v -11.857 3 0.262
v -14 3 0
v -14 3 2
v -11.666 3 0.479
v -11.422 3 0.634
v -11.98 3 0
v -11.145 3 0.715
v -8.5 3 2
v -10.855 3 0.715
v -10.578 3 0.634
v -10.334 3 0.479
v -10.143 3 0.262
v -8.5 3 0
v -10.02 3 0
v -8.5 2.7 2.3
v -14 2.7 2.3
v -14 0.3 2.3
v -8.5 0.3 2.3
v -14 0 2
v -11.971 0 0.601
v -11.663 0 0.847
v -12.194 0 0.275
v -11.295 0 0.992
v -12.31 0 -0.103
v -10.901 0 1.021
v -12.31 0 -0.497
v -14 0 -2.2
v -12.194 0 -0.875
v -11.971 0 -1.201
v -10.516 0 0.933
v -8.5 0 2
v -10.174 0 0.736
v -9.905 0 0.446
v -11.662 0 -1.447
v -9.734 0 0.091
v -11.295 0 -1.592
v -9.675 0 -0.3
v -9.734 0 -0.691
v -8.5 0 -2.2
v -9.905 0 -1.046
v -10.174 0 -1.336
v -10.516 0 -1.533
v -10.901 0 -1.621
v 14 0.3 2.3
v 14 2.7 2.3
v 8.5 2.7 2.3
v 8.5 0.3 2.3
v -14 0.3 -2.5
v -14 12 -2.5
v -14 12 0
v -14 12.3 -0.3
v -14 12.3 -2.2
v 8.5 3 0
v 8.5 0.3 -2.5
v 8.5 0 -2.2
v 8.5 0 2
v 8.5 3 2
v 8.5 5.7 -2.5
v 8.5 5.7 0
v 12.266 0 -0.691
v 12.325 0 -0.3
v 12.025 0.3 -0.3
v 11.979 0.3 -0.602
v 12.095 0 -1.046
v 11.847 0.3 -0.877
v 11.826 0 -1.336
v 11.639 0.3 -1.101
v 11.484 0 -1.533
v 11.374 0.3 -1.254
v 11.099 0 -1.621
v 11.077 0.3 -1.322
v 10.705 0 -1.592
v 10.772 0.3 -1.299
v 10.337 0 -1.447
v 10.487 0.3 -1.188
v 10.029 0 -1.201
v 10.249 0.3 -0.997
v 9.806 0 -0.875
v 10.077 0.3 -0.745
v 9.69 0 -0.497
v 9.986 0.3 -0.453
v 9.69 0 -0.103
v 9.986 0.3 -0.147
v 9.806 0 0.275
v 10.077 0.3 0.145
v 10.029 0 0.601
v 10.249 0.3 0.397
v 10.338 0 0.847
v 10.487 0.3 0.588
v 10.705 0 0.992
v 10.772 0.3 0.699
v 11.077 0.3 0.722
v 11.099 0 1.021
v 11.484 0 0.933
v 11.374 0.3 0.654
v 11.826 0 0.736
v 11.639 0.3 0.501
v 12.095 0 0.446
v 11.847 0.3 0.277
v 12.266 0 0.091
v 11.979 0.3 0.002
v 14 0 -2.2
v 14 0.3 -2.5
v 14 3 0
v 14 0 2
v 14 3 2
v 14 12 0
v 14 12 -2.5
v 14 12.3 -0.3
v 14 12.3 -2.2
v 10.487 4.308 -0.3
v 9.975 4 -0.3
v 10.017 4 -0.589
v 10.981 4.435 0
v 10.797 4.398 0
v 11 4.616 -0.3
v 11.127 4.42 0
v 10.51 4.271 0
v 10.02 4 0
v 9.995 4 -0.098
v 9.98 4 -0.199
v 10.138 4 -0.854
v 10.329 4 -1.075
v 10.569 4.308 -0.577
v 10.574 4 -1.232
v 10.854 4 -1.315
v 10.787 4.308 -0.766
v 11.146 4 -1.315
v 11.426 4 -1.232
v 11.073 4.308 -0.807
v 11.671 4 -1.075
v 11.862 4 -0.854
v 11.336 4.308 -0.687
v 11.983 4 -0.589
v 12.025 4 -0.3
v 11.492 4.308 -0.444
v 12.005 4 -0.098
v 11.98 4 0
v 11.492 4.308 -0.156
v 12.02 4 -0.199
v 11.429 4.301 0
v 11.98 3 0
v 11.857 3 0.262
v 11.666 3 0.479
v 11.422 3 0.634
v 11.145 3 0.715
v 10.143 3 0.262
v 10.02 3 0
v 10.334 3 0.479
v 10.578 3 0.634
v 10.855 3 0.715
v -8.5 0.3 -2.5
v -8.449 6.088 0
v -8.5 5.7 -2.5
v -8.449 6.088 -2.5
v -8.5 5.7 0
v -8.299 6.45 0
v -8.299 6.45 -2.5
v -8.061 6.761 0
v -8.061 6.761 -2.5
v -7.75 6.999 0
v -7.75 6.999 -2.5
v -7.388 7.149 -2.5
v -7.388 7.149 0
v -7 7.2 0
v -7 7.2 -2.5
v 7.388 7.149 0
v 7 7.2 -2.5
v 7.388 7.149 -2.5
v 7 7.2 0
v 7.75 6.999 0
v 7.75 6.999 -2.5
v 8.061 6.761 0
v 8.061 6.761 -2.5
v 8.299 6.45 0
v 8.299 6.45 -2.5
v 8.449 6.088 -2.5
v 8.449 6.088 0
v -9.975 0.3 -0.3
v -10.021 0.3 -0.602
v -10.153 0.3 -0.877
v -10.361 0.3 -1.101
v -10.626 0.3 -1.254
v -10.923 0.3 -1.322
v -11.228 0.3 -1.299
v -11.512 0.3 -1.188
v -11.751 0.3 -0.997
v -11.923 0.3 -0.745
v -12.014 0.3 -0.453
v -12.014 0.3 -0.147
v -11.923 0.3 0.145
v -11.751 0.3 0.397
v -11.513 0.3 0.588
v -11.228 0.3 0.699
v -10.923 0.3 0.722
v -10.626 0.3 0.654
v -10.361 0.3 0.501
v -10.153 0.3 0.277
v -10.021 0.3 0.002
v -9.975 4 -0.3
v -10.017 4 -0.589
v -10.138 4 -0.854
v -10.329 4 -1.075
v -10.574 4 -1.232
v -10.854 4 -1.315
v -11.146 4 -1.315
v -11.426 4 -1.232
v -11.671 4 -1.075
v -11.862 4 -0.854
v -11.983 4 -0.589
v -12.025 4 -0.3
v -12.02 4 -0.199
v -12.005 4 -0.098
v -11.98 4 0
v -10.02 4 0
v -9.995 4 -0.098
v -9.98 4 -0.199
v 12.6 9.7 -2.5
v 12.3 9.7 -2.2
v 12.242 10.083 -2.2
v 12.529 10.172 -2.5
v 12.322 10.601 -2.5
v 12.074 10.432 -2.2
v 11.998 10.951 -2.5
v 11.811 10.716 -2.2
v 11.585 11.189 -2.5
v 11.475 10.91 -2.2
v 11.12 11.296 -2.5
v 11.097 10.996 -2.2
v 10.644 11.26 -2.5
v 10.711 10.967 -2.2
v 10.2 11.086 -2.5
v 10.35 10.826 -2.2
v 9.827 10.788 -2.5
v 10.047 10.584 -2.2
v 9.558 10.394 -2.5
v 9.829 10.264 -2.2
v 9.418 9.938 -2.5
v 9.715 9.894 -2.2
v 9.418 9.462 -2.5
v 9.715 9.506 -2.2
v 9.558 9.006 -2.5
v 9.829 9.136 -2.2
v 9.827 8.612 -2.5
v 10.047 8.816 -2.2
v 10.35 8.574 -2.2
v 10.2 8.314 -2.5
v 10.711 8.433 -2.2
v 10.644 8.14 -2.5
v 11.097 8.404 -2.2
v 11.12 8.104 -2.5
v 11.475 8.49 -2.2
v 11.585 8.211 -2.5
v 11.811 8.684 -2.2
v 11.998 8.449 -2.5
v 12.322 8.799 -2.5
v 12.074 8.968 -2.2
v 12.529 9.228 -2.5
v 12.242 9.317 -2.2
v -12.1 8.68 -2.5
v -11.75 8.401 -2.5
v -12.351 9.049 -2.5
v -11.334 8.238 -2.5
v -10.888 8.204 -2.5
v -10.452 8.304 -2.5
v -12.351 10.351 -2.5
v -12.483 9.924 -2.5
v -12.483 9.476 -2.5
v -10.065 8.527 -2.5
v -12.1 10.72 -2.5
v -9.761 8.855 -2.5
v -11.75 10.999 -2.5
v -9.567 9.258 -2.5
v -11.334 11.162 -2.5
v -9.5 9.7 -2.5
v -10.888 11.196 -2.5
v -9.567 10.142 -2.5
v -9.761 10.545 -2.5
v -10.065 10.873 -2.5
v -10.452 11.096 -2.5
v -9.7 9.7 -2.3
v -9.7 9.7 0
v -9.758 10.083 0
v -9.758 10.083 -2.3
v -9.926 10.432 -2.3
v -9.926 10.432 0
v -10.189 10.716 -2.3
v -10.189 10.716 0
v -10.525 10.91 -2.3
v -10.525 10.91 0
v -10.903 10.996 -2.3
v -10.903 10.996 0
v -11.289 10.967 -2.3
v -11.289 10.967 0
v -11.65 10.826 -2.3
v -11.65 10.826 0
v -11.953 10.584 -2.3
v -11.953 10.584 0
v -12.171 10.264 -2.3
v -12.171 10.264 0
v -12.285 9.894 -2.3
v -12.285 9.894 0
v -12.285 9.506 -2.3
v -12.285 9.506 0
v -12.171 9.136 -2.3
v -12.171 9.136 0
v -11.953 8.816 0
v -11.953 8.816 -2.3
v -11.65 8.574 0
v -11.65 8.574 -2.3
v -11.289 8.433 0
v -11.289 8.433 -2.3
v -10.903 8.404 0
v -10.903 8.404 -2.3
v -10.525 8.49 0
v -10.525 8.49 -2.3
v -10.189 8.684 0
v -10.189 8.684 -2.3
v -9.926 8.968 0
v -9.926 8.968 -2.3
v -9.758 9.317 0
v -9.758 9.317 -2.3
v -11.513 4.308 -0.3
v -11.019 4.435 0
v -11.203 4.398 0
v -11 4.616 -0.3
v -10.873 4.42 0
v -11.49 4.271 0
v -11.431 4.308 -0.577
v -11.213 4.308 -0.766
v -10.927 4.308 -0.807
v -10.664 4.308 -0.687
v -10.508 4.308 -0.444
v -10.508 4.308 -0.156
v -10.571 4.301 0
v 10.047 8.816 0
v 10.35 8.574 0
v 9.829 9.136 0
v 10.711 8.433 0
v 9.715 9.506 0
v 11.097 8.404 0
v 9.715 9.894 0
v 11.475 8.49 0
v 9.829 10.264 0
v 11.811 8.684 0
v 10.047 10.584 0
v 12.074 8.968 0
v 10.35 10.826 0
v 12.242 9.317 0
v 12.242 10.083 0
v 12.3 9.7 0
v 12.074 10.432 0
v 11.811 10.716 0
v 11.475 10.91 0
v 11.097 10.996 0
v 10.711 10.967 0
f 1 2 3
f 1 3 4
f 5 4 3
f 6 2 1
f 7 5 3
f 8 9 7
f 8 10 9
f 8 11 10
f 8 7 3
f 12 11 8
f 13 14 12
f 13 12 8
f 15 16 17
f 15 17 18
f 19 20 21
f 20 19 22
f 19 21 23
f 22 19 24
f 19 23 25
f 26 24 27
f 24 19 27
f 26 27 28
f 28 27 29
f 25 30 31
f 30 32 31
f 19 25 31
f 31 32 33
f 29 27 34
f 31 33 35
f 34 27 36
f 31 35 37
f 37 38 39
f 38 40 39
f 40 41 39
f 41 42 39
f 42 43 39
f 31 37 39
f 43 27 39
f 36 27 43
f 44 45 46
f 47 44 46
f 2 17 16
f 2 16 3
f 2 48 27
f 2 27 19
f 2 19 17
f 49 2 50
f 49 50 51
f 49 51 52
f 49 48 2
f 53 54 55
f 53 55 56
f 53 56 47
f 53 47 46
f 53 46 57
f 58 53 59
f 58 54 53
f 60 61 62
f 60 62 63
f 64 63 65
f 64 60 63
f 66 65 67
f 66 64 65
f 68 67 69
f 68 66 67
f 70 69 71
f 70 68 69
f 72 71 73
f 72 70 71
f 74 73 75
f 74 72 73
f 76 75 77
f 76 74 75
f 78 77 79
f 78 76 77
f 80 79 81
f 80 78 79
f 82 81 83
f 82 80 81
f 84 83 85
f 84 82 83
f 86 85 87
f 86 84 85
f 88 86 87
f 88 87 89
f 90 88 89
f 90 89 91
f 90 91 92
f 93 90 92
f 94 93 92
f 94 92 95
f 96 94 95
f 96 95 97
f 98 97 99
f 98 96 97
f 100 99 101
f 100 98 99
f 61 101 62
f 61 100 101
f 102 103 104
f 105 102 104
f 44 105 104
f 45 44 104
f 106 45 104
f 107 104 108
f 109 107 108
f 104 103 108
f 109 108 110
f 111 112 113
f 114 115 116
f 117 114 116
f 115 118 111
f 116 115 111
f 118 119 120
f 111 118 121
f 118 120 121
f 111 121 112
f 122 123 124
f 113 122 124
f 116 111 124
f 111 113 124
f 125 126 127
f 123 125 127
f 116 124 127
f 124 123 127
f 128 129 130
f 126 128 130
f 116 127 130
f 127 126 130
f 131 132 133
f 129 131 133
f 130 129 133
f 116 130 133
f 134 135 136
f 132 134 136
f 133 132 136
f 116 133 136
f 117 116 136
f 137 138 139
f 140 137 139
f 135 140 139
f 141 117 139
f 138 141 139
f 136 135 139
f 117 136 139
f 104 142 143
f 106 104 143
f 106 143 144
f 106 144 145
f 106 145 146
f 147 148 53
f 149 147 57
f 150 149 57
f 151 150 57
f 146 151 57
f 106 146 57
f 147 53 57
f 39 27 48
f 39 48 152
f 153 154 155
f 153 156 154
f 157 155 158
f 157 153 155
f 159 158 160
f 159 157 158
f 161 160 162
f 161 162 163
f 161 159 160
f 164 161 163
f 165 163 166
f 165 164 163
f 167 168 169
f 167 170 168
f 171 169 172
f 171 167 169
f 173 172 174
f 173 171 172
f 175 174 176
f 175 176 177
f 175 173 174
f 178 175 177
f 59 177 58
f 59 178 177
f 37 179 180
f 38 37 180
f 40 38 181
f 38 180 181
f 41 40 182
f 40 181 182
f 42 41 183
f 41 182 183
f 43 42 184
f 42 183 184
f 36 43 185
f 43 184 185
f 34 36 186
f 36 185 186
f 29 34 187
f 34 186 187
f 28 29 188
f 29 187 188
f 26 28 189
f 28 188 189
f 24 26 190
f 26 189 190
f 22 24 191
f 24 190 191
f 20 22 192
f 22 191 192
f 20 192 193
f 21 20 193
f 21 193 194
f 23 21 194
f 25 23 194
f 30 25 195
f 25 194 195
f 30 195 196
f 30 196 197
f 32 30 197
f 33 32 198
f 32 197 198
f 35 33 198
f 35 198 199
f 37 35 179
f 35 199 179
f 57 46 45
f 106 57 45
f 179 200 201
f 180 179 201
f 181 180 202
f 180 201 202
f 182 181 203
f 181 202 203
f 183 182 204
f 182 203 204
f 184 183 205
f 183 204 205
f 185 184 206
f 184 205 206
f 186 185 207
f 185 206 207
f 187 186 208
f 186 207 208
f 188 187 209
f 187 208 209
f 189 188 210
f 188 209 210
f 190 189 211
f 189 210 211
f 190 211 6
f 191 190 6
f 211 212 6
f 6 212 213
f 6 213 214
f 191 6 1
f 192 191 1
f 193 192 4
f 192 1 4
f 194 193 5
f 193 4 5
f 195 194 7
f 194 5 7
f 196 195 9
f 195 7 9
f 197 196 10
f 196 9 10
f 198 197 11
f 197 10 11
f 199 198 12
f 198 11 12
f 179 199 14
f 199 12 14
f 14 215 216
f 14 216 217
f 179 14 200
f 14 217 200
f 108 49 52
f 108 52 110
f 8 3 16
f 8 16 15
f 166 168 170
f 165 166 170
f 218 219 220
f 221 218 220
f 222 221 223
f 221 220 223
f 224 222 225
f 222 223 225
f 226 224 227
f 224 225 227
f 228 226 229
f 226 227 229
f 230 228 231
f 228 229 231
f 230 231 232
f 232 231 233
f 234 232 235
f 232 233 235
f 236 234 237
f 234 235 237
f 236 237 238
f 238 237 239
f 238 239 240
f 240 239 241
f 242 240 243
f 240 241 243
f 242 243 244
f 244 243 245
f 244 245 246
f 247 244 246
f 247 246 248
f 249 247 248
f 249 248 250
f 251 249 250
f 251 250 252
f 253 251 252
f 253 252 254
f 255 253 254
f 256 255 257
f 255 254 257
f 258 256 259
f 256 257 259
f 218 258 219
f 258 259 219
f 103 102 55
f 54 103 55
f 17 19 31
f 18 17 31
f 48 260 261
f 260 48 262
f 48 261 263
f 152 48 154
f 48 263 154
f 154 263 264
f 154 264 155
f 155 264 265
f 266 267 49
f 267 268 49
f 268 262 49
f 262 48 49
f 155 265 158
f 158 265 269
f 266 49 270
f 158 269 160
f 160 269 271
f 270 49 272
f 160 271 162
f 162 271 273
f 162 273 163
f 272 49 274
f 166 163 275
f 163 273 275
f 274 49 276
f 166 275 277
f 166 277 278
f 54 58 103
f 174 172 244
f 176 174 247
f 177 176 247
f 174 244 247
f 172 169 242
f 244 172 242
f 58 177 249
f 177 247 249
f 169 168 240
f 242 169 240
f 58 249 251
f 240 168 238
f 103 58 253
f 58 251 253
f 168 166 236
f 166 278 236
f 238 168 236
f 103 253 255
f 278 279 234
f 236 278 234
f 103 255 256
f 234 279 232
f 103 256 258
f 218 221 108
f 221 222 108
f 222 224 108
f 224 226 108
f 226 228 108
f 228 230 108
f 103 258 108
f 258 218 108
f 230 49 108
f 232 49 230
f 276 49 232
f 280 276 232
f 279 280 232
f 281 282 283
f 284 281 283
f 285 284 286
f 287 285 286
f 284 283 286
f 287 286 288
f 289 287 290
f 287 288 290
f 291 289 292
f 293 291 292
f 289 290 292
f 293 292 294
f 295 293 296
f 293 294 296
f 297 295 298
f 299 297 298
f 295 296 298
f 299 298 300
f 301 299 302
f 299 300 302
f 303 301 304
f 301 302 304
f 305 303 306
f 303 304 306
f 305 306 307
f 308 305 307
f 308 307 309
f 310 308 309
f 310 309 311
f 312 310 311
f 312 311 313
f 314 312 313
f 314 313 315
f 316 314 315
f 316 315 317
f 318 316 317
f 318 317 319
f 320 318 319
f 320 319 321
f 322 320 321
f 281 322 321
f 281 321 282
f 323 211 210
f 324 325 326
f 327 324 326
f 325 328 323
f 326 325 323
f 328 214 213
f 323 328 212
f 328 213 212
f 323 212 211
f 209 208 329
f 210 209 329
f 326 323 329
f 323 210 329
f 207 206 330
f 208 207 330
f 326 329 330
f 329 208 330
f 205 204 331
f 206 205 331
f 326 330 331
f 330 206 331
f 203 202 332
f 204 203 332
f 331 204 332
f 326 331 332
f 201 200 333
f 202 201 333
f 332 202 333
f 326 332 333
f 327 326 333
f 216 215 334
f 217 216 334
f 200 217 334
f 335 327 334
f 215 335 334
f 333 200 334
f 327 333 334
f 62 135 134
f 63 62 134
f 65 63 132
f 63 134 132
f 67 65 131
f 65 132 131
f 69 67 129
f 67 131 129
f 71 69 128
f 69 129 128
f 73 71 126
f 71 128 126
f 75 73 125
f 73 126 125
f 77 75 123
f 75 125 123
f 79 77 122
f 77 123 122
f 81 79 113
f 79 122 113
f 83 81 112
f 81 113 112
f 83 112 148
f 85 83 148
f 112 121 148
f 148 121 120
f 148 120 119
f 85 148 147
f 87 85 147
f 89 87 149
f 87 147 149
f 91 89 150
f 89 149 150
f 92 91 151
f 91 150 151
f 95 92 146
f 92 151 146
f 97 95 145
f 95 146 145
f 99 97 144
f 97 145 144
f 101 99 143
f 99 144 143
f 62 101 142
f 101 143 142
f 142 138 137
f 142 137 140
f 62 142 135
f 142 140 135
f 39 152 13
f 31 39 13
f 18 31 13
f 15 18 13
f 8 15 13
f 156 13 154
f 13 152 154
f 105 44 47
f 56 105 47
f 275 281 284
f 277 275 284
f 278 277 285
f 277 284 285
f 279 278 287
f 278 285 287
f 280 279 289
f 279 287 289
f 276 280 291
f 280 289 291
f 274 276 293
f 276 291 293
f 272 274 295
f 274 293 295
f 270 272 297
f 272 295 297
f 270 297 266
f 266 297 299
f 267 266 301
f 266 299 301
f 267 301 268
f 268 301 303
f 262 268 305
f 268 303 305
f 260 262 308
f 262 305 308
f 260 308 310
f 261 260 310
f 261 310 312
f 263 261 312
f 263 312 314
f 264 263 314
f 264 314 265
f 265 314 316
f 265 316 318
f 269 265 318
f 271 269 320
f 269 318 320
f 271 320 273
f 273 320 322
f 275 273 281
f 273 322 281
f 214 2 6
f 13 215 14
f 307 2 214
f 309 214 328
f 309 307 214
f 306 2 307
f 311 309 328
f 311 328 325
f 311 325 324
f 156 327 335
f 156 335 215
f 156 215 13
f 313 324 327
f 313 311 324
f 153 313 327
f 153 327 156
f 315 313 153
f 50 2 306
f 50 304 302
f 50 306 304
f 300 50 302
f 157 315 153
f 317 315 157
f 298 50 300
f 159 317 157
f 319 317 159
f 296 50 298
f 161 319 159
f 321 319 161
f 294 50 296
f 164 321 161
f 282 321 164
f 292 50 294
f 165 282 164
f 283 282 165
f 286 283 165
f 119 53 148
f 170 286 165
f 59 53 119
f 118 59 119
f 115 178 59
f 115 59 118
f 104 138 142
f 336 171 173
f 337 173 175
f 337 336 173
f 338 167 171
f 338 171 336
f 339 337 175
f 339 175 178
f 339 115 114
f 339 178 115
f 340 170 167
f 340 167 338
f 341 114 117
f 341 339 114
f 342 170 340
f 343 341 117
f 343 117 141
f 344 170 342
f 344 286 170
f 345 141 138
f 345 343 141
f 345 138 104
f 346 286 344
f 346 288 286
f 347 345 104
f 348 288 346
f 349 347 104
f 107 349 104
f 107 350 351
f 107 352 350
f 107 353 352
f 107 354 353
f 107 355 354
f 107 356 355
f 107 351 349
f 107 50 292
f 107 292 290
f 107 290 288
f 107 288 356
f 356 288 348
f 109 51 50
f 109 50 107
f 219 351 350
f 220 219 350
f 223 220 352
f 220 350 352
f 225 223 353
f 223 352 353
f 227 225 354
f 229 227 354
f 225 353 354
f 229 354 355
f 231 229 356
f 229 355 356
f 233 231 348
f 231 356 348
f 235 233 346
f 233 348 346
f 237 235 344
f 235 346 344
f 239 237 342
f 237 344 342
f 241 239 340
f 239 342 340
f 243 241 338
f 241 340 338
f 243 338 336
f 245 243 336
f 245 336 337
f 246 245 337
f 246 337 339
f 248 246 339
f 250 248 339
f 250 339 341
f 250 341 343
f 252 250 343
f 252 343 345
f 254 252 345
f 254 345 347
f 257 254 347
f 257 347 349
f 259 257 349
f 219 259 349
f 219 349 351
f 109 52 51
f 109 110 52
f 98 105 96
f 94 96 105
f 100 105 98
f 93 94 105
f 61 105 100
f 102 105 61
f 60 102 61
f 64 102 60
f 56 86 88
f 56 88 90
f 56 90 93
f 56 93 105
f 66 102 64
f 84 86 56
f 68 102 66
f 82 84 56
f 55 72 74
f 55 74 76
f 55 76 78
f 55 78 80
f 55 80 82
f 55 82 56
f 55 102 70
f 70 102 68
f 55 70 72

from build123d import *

# Parameters (mm, degrees)
SKETCH1_W                 = 5.5
SKETCH1_H                 = 12.3
BOSS_EXTRUDE1_DEPTH       = 4.8
SKETCH2_W                 = 2.3
SKETCH2_H                 = 9.3
CUT_EXTRUDE1_DEPTH        = 6.5
SKETCH3_W                 = 2.5
SKETCH3_H                 = 5.1
BOSS_EXTRUDE2_DEPTH       = 22.5
SKETCH4_W                 = 5.5
SKETCH4_H                 = 2.5
BOSS_EXTRUDE3_DEPTH       = 7.2
SKETCH5_W                 = 5.5
SKETCH5_H                 = 3
BOSS_EXTRUDE4_DEPTH       = 2.3
F_2_CLEARANCE_HOLE1_D     = 2.6
F_2_CLEARANCE_HOLE1_DEPTH = 4.8
F_1_CLEARANCE_HOLE1_D     = 2.05
F_1_CLEARANCE_HOLE1_DEPTH = 4
F_1_CLEARANCE_HOLE1_TIP   = 0.615882135
CHAMFER1_SIZE             = 0.3
CHAMFER2_SIZE             = 0.2
FILLET1_R                 = 1.5


with BuildPart() as part:
    # Sketch1 → Boss-Extrude1 (new body)
    with BuildSketch(Plane(origin=(0, 0, -2.5), x_dir=(-1, 0, 0), z_dir=(0, 0, -1))):
        with Locations((-11.25, 6.15)):
            Rectangle(SKETCH1_W, SKETCH1_H)
    extrude(amount=-BOSS_EXTRUDE1_DEPTH)

    # Sketch2 → Cut-Extrude1 (cut, through all)
    with BuildSketch(Plane.ZY.offset(-8.5)):
        with Locations((1.15, 7.65)):
            Rectangle(SKETCH2_W, SKETCH2_H)
    extrude(amount=-CUT_EXTRUDE1_DEPTH, mode=Mode.SUBTRACT)

    # Sketch3 → Boss-Extrude2 (add)
    with BuildSketch(Plane.ZY.offset(-8.5)):
        with Locations((-1.25, 9.75)):
            Rectangle(SKETCH3_W, SKETCH3_H)
    extrude(amount=BOSS_EXTRUDE2_DEPTH)

    # Sketch4 → Boss-Extrude3 (add)
    with BuildSketch(Plane.XZ.offset(-7.2)):
        with Locations((-11.25, -1.25)):
            Rectangle(SKETCH4_W, SKETCH4_H)
    extrude(amount=BOSS_EXTRUDE3_DEPTH)

    # Sketch5 → Boss-Extrude4 (add)
    with BuildSketch(Plane.XY):
        with Locations((-11.25, 1.5)):
            Rectangle(SKETCH5_W, SKETCH5_H)
    extrude(amount=BOSS_EXTRUDE4_DEPTH)

    # #2 Clearance Hole1
    with Locations(Plane(origin=(0, 0, -2.5), x_dir=(-1, 0, 0), z_dir=(0, 0, -1))):
        with Locations((11, 9.7), (-11, 9.7)):
            Hole(F_2_CLEARANCE_HOLE1_D / 2, depth=F_2_CLEARANCE_HOLE1_DEPTH)

    # #1 Clearance Hole1
    with Locations(Plane(origin=(0, 0, 0), x_dir=(-1, 0, 0), z_dir=(0, -1, 0))):
        with Locations((-11, 0.3), (11, 0.3)):
            Hole(F_1_CLEARANCE_HOLE1_D / 2, depth=F_1_CLEARANCE_HOLE1_DEPTH)
            with Locations((0, 0, -(F_1_CLEARANCE_HOLE1_DEPTH + F_1_CLEARANCE_HOLE1_TIP / 2))):  # 118° drill point
                Cone(0, F_1_CLEARANCE_HOLE1_D / 2, F_1_CLEARANCE_HOLE1_TIP, mode=Mode.SUBTRACT)

    # Chamfer1
    chamfer1_edges = [part.edges().sort_by_distance(p)[0] for p in [
        (11.25, 3, 2.3),
        (0, 12.3, 0),
        (11.25, 0, 2.3),
        (-11.25, 0, -2.5),
        (0, 12.3, -2.5),
        (-11.25, 0, 2.3),
        (11.25, 0, -2.5),
        (-11.25, 3, 2.3),
        (9.7, 9.7, -2.5),
        (-12.025, 0, -0.3),
        (9.975, 0, -0.3),
    ]]
    chamfer(chamfer1_edges, length=CHAMFER1_SIZE)

    # Chamfer2
    chamfer2_edges = [part.edges().sort_by_distance(p)[0] for p in [
        (-12.3, 9.7, -2.5),
    ]]
    chamfer(chamfer2_edges, length=CHAMFER2_SIZE)

    # Fillet1
    fillet1_edges = [part.edges().sort_by_distance(p)[0] for p in [
        (8.5, 7.2, -1.25),
        (-8.5, 7.2, -1.25),
    ]]
    fillet(fillet1_edges, radius=FILLET1_R)


solid = part.part
